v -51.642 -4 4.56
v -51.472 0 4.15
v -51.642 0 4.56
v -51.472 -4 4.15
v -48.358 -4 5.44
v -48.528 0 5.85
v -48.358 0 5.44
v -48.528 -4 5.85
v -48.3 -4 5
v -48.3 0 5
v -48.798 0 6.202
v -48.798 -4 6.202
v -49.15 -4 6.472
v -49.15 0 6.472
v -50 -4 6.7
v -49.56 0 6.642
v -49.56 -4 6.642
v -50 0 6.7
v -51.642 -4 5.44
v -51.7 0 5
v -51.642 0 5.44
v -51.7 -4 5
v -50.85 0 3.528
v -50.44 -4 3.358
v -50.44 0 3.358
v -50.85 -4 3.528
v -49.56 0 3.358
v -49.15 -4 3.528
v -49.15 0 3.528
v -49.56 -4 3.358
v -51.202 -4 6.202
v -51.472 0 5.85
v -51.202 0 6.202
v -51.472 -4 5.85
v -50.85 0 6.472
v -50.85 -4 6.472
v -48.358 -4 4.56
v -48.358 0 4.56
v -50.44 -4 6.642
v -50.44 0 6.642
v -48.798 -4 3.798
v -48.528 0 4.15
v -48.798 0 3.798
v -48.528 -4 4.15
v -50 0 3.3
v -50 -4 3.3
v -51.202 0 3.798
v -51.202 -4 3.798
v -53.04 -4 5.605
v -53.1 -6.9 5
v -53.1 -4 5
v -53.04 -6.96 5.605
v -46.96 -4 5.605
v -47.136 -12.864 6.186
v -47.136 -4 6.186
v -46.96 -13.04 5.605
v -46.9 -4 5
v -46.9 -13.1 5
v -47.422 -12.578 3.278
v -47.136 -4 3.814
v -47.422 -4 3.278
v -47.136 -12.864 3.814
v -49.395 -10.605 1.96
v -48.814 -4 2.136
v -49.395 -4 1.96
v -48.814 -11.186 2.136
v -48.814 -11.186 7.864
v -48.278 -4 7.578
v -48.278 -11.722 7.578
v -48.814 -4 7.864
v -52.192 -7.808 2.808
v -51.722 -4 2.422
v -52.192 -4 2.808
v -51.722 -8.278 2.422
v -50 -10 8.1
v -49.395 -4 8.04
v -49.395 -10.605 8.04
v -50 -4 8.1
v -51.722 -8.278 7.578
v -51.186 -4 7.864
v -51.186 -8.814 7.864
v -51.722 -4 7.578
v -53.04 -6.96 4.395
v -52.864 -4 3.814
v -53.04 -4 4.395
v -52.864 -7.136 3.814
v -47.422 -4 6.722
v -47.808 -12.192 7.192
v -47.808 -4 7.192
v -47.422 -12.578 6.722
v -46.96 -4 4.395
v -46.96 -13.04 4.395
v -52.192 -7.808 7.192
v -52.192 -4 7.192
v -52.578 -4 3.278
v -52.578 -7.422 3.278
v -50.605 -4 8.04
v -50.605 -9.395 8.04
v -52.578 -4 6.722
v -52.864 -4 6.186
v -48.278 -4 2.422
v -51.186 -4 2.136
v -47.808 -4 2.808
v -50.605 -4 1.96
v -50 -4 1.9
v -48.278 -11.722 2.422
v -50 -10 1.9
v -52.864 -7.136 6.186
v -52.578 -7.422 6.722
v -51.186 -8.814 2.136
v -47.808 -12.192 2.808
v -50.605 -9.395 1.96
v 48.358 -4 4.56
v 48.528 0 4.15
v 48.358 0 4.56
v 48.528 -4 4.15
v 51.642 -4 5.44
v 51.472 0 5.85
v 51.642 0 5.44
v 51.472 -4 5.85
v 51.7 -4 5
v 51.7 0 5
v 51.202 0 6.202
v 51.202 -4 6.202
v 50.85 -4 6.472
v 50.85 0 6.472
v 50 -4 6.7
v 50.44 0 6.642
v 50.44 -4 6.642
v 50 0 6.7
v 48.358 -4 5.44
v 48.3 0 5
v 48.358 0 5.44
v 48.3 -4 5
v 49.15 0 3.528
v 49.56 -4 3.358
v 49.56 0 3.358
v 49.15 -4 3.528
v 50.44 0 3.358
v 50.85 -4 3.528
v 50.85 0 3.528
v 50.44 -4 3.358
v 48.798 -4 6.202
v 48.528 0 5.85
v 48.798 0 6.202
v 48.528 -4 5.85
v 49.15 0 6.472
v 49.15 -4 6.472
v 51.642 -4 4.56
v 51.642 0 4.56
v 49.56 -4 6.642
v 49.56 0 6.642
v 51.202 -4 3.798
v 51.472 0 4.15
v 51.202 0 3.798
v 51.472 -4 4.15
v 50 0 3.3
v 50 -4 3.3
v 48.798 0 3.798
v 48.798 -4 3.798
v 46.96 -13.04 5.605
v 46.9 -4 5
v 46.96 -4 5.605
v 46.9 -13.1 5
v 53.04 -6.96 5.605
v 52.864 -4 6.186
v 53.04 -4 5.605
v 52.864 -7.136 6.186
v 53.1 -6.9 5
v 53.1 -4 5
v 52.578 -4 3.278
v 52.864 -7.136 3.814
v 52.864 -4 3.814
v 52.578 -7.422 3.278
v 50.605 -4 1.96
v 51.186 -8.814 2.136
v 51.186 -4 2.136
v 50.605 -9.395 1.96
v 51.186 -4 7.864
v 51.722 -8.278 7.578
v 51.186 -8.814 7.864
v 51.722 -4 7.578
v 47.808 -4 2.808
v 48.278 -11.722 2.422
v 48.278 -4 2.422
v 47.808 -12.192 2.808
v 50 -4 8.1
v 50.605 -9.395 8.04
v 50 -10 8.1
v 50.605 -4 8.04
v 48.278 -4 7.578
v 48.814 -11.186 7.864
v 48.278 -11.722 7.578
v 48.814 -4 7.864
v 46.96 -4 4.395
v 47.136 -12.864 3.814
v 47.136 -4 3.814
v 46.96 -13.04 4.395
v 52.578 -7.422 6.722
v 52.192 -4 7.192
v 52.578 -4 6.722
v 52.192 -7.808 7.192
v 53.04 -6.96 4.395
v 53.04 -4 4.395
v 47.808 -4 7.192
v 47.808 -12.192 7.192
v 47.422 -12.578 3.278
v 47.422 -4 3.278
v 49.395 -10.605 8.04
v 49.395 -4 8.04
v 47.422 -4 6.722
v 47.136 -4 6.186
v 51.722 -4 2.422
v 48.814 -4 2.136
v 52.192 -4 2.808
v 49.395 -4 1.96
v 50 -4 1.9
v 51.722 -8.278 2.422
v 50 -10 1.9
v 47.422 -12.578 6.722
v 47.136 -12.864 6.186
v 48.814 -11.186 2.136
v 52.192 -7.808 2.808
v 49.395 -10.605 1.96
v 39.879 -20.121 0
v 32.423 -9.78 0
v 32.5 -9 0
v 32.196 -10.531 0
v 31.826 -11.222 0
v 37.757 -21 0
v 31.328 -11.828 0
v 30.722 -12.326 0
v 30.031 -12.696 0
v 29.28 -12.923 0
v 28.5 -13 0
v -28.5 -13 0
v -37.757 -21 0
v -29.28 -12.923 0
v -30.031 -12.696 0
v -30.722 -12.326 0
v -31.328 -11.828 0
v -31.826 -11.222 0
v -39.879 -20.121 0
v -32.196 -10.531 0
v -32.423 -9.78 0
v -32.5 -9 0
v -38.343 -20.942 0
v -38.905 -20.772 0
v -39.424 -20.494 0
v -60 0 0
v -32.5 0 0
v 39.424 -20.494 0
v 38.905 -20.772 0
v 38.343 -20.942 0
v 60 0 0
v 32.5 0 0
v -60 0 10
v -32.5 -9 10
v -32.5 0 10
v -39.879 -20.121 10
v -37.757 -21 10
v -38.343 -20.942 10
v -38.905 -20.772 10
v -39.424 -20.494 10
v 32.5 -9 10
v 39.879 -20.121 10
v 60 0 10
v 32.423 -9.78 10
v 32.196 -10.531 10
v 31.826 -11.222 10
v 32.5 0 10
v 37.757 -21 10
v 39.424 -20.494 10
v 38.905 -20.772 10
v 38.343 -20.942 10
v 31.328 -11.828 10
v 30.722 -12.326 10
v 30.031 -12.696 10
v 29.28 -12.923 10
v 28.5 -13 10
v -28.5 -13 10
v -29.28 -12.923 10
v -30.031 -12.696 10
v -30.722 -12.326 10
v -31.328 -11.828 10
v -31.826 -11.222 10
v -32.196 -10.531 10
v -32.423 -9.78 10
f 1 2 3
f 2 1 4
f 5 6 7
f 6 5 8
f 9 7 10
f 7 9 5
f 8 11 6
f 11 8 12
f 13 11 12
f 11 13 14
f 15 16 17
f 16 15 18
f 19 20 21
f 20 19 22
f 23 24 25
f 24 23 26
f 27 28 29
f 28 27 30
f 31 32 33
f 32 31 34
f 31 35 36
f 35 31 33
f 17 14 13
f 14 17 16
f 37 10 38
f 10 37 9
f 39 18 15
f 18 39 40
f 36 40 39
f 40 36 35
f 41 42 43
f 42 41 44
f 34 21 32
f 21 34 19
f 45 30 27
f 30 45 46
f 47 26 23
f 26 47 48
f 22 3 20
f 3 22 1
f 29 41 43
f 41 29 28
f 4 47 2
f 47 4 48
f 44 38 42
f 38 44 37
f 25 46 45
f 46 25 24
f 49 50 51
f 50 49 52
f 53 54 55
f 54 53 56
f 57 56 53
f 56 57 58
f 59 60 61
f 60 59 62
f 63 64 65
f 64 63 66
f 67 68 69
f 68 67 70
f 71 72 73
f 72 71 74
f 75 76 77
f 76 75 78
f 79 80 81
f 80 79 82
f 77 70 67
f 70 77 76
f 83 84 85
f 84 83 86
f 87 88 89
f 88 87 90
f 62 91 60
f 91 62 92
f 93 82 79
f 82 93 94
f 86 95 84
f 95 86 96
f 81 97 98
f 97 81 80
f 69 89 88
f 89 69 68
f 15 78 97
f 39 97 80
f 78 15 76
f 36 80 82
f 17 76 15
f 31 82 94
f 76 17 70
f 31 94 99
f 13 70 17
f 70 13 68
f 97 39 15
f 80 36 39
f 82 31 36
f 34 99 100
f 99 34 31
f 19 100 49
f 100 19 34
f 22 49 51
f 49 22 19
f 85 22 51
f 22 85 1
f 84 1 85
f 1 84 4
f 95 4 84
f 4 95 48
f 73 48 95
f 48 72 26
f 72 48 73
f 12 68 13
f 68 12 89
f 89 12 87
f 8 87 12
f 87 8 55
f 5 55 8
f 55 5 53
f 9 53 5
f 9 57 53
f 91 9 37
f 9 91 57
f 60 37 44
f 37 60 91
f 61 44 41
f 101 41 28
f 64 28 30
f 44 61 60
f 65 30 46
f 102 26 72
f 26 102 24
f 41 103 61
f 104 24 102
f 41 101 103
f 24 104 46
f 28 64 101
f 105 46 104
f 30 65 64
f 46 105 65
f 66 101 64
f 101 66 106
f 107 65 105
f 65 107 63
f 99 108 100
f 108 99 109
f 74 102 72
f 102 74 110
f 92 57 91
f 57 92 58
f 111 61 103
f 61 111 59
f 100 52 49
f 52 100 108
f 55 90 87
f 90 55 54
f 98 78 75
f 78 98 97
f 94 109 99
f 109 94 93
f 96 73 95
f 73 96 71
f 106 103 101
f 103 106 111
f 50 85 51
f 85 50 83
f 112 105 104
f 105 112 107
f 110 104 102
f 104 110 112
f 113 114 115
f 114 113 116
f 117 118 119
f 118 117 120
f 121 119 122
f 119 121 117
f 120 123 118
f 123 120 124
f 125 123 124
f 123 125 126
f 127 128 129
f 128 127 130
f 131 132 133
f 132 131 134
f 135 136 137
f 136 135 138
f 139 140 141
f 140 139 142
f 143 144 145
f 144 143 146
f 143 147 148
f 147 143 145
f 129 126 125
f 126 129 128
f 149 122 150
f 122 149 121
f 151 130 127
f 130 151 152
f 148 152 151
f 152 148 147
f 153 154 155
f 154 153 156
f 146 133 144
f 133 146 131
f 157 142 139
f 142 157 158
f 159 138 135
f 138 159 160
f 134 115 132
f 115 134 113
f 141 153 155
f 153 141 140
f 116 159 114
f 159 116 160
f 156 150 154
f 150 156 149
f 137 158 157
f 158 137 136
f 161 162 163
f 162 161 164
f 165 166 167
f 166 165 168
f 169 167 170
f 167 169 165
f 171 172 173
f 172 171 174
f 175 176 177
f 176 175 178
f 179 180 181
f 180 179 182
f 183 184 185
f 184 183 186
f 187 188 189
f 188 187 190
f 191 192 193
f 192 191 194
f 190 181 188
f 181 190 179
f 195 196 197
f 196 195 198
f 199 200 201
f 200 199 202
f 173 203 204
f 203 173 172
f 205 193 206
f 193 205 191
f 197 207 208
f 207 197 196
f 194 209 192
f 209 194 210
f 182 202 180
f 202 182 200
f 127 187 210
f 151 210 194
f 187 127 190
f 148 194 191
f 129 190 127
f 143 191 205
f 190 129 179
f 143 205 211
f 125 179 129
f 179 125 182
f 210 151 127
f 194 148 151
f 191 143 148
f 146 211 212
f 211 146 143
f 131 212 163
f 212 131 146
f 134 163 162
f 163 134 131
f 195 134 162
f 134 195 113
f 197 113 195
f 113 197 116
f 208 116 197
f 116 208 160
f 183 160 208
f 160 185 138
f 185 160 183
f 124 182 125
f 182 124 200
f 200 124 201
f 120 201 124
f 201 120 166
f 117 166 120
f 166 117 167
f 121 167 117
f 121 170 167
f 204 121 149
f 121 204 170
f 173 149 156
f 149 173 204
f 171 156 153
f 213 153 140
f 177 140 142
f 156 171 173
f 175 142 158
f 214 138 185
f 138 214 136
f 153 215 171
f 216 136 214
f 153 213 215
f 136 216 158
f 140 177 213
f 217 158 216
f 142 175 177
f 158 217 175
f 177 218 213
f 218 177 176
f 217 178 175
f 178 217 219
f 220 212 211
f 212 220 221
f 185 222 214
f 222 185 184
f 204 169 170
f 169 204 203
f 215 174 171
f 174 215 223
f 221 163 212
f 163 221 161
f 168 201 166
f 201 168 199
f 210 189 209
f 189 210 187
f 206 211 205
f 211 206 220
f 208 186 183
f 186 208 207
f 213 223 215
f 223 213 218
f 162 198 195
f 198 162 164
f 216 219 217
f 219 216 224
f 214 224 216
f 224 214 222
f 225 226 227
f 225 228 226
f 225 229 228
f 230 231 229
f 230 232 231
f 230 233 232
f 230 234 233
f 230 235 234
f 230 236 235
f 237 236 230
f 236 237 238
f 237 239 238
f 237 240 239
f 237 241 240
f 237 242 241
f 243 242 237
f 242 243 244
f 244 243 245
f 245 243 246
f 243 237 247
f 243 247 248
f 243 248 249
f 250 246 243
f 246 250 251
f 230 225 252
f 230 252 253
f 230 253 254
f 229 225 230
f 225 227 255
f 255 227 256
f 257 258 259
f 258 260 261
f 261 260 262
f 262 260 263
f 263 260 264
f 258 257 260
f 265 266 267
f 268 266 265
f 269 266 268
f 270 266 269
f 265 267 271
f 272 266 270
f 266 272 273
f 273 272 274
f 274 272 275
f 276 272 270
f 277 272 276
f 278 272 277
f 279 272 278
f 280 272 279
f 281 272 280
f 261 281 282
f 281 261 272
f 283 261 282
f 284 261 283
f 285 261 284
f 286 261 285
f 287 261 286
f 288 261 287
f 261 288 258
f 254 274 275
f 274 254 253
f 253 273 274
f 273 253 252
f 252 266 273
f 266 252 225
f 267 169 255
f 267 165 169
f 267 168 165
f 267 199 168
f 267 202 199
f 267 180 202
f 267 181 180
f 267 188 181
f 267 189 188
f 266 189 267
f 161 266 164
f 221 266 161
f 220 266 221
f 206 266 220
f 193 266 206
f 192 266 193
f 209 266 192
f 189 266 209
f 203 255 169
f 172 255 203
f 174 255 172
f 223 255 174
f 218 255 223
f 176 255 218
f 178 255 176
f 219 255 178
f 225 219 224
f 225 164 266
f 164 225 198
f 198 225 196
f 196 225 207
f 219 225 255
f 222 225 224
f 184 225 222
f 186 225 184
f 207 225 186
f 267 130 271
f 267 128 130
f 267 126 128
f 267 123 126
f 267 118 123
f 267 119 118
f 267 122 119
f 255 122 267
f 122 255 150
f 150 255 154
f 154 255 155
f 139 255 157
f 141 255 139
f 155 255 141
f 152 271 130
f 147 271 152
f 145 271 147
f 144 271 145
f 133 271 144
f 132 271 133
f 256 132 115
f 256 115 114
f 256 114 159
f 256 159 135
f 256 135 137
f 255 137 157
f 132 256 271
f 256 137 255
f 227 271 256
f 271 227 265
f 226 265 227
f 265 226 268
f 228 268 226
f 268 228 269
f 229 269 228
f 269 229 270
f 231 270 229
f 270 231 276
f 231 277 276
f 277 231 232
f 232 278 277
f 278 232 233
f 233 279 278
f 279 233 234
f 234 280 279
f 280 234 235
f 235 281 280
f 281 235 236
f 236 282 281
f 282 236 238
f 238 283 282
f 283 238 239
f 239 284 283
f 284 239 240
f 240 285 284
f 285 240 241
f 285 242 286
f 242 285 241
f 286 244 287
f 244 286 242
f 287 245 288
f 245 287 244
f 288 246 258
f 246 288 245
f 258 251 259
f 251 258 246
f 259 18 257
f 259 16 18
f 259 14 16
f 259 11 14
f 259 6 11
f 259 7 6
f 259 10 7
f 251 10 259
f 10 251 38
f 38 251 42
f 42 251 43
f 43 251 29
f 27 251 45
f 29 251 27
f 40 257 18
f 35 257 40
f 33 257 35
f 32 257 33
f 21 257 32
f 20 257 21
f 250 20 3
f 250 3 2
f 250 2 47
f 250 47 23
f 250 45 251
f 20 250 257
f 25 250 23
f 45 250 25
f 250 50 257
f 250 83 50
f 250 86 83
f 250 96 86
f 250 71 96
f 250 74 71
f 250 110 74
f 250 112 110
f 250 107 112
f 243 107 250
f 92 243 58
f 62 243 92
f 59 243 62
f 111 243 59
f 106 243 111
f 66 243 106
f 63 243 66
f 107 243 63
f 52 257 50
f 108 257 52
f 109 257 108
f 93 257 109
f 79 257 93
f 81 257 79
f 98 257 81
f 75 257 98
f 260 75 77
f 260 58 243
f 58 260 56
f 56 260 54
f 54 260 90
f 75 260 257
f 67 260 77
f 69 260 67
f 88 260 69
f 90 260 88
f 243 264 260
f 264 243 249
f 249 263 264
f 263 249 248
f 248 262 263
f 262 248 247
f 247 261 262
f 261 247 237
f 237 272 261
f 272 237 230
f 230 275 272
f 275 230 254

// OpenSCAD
// 2026-11-14: tapered D-pull for the door, after Justin's red cart handle: the outer ends slope in
// at 45 degrees from the frame to the grip, and the 2 M3 go in through those slopes, square to the
// frame, like the red one. 10 mm tall to match the 1010 door frame (the red one is for 2020).
// Justin: 120 max along the frame, 65 opening, screws 100 apart. With 45 degree ends that fixes
// the depth: the grip face (base - 2 dep) must hold the 65 opening plus 2 legs, so dep <= ~21.
// The top member's slot nuts are not captured, so they slide to the 100 spacing.
// Printed flat, this profile on the bed. Units mm.
// Profile in (x, y): y = 0 on the frame's outer face, grip face at y = -dep.

base  = 120;              // along the frame (max, Justin)
dep   = 21;               // out from the frame
face  = base - 2 * dep;   // 45-degree ends: 78
h     = 10;               // = 1010 member
bar   = 8;                // grip thickness: leaves dep - bar = 13 for the fingers
op    = 65;               // finger opening (Justin)
sc    = 100;              // screws, on the slopes (Justin)
floor_t = 4;              // plastic under the screw head
r_out = 3; r_in = 4;

module profile() difference() {
    offset(r = r_out, $fn = 32) offset(delta = -r_out)
        polygon([[-base / 2 - 2 * r_out, 2 * r_out], [base / 2 + 2 * r_out, 2 * r_out], [face / 2, -dep], [-face / 2, -dep]]);   // runs past the frame, clipped below: sharp back corners
    offset(r = r_in, $fn = 32) offset(delta = -r_in) translate([-op / 2, -dep + bar]) square([op, dep - bar + 10]);
    translate([-base, 0]) square([2 * base, 20]);          // back flat on the frame
}
module handle() difference() {
    linear_extrude(h) profile();
    for (m = [-1, 1]) translate([m * sc / 2, 1, h / 2]) rotate([90, 0, 0]) {
        cylinder(d = 3.4, h = dep + 2, $fn = 24);
        translate([0, 0, 1 + floor_t]) cylinder(d = 6.2, h = dep, $fn = 32);   // head counterbore, opens on the slope
    }
}
handle();
echo(str("handle base ", base, ", face ", face, ", out ", dep, ", tall ", h, ", screws ", sc,
         " apart on the slopes (slope ", base / 2 - sc / 2, " out there), opening ", op, " x ", dep - bar, " deep"));
